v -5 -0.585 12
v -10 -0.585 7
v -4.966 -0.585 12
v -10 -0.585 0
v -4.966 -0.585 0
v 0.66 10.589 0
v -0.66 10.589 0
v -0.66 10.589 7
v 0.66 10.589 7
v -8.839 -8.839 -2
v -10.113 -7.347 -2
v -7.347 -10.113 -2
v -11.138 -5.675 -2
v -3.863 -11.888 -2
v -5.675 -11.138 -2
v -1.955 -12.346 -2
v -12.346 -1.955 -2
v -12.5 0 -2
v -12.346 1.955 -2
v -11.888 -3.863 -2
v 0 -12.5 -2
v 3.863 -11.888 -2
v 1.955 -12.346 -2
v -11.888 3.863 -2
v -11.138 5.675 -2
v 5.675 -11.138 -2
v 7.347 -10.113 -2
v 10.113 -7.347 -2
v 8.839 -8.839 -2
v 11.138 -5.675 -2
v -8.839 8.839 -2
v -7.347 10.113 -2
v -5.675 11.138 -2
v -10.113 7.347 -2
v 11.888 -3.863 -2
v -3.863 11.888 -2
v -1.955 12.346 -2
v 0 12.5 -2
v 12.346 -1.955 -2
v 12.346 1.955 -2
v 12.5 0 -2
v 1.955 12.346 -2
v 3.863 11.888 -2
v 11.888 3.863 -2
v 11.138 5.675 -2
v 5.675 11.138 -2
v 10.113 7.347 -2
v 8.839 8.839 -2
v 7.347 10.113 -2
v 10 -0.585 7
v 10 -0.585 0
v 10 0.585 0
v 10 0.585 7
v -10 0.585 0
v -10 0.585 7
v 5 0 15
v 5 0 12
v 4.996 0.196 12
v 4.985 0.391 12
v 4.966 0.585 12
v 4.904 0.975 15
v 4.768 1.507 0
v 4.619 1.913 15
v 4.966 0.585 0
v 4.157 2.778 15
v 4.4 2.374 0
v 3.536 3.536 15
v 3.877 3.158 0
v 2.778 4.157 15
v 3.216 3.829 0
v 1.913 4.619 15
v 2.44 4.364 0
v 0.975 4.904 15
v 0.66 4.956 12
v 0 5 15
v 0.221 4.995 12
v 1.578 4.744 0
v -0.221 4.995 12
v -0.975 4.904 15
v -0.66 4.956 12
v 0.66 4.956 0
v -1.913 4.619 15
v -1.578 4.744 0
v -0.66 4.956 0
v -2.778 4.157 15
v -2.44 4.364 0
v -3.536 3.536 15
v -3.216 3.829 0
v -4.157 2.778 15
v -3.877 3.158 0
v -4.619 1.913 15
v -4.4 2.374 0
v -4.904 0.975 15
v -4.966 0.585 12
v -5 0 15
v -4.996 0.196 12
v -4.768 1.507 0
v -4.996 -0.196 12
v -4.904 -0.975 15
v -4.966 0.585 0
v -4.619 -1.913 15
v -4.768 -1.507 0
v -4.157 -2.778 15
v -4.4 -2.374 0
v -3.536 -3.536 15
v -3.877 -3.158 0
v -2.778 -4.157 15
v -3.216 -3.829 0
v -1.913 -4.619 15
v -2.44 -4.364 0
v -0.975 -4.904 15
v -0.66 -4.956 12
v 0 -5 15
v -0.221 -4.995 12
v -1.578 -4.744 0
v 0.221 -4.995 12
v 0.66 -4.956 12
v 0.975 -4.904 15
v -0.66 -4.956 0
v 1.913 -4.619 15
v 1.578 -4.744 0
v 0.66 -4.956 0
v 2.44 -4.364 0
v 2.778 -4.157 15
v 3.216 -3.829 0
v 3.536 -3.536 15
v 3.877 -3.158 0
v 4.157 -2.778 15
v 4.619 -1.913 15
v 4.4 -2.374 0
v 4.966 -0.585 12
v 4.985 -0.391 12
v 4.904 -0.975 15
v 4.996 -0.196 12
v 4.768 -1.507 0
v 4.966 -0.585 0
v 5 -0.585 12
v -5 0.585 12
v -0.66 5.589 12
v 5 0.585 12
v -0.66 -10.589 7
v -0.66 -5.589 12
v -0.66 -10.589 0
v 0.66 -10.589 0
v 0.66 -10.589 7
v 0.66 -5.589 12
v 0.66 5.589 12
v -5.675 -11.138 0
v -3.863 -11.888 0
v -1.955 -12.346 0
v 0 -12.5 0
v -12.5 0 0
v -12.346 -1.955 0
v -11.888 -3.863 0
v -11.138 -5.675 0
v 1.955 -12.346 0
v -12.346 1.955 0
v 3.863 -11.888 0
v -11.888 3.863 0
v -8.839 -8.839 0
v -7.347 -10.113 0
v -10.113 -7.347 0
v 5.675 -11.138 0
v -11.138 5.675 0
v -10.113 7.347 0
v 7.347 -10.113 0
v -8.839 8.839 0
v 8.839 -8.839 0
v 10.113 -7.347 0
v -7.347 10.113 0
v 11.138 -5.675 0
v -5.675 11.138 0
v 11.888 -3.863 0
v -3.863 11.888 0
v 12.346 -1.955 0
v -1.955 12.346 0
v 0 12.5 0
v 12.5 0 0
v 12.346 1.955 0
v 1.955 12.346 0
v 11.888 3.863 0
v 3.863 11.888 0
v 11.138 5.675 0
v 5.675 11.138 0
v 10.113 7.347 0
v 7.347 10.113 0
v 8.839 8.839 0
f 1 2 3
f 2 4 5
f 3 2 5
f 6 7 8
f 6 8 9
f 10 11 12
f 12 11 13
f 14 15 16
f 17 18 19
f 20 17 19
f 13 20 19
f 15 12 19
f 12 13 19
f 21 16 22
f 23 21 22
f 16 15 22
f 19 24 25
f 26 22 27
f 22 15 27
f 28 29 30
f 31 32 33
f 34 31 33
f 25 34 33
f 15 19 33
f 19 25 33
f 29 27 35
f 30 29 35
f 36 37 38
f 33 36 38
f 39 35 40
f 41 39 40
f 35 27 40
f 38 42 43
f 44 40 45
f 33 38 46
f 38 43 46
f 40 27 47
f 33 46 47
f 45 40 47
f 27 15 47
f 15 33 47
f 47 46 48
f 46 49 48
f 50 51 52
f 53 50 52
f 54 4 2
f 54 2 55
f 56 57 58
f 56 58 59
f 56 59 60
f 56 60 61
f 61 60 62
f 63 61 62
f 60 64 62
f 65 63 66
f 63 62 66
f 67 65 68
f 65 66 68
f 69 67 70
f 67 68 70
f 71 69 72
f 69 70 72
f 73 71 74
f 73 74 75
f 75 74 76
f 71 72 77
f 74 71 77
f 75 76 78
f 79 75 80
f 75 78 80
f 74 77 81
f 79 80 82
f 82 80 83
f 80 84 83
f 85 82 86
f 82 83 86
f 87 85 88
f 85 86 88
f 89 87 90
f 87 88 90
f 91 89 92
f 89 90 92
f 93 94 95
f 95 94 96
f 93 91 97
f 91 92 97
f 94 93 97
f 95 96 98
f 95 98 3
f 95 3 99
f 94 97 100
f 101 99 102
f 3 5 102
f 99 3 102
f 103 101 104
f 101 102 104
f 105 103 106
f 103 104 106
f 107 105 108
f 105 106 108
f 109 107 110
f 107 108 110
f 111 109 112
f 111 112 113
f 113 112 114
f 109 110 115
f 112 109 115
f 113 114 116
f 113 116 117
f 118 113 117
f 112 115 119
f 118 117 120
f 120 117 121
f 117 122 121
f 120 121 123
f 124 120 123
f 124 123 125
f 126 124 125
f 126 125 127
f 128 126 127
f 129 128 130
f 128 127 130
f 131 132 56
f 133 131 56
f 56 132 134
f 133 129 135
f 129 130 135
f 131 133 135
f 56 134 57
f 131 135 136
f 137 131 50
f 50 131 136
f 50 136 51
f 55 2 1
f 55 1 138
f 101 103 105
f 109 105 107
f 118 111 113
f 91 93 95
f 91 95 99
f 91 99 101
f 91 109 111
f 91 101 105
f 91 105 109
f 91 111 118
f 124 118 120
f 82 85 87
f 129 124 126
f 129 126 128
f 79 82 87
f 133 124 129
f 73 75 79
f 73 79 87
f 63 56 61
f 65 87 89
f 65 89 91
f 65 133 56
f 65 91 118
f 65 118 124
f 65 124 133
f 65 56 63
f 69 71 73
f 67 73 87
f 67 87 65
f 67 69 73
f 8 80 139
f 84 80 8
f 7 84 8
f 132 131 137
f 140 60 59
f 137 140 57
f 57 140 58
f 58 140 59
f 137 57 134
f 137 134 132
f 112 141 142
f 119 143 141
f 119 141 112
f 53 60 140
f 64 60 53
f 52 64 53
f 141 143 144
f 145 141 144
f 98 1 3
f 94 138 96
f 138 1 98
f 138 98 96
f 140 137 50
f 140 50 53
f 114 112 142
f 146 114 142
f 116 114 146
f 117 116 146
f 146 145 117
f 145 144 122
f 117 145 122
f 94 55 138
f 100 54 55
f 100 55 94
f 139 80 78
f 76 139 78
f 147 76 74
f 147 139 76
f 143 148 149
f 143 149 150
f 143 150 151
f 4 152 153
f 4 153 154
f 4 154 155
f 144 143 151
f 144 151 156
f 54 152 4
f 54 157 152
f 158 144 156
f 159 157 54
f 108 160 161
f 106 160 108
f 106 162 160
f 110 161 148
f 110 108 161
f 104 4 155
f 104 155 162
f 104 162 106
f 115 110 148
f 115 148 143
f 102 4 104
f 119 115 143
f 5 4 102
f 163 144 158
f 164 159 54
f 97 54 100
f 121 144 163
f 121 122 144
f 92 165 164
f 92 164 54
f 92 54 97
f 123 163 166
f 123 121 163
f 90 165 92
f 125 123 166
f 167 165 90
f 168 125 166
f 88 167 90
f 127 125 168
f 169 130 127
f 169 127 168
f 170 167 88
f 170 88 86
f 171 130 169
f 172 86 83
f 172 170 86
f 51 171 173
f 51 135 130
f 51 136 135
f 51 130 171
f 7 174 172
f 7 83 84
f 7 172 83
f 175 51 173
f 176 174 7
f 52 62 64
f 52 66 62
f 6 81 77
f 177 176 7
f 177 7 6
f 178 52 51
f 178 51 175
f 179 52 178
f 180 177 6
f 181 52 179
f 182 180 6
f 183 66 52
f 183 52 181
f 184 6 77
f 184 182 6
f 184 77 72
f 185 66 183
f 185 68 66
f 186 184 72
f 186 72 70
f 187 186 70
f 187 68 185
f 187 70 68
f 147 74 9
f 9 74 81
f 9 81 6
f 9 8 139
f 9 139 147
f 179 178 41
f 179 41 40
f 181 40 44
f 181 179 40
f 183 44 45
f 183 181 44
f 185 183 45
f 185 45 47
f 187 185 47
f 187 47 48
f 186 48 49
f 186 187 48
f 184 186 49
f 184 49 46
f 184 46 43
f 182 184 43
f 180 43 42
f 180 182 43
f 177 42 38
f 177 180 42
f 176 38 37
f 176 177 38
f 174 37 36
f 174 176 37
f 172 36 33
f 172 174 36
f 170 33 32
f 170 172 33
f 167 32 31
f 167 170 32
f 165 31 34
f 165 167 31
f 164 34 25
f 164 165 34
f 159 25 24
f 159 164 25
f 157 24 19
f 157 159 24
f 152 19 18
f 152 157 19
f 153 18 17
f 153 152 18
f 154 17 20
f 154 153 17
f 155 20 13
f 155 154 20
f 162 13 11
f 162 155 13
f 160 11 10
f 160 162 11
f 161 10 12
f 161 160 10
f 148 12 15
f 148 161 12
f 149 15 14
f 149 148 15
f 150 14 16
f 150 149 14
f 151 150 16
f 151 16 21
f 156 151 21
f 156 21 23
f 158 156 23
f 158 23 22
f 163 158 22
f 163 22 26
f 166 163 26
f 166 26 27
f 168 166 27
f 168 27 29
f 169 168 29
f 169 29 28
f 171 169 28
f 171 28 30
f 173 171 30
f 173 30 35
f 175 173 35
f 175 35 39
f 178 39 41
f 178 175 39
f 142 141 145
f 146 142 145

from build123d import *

# Parameters (mm, degrees)
F0_R     = 5
F2_DEPTH = 15
F1_W     = 9.3396854261
F1_H     = 1.1709111985
F1_W_2   = 1.3206291478
F1_H_2   = 10.0037873136
F3_DEPTH = 12
F4_SIZE  = 4.99999
F5_R     = 12.5
F6_DEPTH = 2


# Not quite as in the source:
# - a fillet or chamfer is up to 0.001 mm smaller than in the source, because OpenCascade refuses the exact size


with BuildPart() as f2:
    # F0 (on Top) → F2 (new body)
    with BuildSketch(Plane.XY):
        Circle(F0_R)
    extrude(amount=F2_DEPTH)

    # F1 (on Top) → F3 (join)
    with BuildSketch(Plane.XY):
        with Locations((5.330157287, 0)):
            Rectangle(F1_W, F1_H)
        with Locations((-5.330157287, 0)):
            Rectangle(F1_W, F1_H)
        with Locations((0, 5.587349256)):
            Rectangle(F1_W_2, F1_H_2)
        with Locations((0, -5.587349256)):
            Rectangle(F1_W_2, F1_H_2)
    extrude(amount=F3_DEPTH)

    # F4 (size 5 in the source; OpenCascade refuses exactly that, so slightly less here)
    f4_edges = [f2.edges().sort_by_distance(p)[0] for p in [
        (0, 10.589243, 12),
        (10, 0, 12),
        (0, -10.589243, 12),
        (-10, 0, 12),
    ]]
    chamfer(f4_edges, length=F4_SIZE)

    # F5 (on Top) → F6 (join)
    with BuildSketch(Plane.XY):
        Circle(F5_R)
    extrude(amount=-F6_DEPTH)


solid = f2.part
